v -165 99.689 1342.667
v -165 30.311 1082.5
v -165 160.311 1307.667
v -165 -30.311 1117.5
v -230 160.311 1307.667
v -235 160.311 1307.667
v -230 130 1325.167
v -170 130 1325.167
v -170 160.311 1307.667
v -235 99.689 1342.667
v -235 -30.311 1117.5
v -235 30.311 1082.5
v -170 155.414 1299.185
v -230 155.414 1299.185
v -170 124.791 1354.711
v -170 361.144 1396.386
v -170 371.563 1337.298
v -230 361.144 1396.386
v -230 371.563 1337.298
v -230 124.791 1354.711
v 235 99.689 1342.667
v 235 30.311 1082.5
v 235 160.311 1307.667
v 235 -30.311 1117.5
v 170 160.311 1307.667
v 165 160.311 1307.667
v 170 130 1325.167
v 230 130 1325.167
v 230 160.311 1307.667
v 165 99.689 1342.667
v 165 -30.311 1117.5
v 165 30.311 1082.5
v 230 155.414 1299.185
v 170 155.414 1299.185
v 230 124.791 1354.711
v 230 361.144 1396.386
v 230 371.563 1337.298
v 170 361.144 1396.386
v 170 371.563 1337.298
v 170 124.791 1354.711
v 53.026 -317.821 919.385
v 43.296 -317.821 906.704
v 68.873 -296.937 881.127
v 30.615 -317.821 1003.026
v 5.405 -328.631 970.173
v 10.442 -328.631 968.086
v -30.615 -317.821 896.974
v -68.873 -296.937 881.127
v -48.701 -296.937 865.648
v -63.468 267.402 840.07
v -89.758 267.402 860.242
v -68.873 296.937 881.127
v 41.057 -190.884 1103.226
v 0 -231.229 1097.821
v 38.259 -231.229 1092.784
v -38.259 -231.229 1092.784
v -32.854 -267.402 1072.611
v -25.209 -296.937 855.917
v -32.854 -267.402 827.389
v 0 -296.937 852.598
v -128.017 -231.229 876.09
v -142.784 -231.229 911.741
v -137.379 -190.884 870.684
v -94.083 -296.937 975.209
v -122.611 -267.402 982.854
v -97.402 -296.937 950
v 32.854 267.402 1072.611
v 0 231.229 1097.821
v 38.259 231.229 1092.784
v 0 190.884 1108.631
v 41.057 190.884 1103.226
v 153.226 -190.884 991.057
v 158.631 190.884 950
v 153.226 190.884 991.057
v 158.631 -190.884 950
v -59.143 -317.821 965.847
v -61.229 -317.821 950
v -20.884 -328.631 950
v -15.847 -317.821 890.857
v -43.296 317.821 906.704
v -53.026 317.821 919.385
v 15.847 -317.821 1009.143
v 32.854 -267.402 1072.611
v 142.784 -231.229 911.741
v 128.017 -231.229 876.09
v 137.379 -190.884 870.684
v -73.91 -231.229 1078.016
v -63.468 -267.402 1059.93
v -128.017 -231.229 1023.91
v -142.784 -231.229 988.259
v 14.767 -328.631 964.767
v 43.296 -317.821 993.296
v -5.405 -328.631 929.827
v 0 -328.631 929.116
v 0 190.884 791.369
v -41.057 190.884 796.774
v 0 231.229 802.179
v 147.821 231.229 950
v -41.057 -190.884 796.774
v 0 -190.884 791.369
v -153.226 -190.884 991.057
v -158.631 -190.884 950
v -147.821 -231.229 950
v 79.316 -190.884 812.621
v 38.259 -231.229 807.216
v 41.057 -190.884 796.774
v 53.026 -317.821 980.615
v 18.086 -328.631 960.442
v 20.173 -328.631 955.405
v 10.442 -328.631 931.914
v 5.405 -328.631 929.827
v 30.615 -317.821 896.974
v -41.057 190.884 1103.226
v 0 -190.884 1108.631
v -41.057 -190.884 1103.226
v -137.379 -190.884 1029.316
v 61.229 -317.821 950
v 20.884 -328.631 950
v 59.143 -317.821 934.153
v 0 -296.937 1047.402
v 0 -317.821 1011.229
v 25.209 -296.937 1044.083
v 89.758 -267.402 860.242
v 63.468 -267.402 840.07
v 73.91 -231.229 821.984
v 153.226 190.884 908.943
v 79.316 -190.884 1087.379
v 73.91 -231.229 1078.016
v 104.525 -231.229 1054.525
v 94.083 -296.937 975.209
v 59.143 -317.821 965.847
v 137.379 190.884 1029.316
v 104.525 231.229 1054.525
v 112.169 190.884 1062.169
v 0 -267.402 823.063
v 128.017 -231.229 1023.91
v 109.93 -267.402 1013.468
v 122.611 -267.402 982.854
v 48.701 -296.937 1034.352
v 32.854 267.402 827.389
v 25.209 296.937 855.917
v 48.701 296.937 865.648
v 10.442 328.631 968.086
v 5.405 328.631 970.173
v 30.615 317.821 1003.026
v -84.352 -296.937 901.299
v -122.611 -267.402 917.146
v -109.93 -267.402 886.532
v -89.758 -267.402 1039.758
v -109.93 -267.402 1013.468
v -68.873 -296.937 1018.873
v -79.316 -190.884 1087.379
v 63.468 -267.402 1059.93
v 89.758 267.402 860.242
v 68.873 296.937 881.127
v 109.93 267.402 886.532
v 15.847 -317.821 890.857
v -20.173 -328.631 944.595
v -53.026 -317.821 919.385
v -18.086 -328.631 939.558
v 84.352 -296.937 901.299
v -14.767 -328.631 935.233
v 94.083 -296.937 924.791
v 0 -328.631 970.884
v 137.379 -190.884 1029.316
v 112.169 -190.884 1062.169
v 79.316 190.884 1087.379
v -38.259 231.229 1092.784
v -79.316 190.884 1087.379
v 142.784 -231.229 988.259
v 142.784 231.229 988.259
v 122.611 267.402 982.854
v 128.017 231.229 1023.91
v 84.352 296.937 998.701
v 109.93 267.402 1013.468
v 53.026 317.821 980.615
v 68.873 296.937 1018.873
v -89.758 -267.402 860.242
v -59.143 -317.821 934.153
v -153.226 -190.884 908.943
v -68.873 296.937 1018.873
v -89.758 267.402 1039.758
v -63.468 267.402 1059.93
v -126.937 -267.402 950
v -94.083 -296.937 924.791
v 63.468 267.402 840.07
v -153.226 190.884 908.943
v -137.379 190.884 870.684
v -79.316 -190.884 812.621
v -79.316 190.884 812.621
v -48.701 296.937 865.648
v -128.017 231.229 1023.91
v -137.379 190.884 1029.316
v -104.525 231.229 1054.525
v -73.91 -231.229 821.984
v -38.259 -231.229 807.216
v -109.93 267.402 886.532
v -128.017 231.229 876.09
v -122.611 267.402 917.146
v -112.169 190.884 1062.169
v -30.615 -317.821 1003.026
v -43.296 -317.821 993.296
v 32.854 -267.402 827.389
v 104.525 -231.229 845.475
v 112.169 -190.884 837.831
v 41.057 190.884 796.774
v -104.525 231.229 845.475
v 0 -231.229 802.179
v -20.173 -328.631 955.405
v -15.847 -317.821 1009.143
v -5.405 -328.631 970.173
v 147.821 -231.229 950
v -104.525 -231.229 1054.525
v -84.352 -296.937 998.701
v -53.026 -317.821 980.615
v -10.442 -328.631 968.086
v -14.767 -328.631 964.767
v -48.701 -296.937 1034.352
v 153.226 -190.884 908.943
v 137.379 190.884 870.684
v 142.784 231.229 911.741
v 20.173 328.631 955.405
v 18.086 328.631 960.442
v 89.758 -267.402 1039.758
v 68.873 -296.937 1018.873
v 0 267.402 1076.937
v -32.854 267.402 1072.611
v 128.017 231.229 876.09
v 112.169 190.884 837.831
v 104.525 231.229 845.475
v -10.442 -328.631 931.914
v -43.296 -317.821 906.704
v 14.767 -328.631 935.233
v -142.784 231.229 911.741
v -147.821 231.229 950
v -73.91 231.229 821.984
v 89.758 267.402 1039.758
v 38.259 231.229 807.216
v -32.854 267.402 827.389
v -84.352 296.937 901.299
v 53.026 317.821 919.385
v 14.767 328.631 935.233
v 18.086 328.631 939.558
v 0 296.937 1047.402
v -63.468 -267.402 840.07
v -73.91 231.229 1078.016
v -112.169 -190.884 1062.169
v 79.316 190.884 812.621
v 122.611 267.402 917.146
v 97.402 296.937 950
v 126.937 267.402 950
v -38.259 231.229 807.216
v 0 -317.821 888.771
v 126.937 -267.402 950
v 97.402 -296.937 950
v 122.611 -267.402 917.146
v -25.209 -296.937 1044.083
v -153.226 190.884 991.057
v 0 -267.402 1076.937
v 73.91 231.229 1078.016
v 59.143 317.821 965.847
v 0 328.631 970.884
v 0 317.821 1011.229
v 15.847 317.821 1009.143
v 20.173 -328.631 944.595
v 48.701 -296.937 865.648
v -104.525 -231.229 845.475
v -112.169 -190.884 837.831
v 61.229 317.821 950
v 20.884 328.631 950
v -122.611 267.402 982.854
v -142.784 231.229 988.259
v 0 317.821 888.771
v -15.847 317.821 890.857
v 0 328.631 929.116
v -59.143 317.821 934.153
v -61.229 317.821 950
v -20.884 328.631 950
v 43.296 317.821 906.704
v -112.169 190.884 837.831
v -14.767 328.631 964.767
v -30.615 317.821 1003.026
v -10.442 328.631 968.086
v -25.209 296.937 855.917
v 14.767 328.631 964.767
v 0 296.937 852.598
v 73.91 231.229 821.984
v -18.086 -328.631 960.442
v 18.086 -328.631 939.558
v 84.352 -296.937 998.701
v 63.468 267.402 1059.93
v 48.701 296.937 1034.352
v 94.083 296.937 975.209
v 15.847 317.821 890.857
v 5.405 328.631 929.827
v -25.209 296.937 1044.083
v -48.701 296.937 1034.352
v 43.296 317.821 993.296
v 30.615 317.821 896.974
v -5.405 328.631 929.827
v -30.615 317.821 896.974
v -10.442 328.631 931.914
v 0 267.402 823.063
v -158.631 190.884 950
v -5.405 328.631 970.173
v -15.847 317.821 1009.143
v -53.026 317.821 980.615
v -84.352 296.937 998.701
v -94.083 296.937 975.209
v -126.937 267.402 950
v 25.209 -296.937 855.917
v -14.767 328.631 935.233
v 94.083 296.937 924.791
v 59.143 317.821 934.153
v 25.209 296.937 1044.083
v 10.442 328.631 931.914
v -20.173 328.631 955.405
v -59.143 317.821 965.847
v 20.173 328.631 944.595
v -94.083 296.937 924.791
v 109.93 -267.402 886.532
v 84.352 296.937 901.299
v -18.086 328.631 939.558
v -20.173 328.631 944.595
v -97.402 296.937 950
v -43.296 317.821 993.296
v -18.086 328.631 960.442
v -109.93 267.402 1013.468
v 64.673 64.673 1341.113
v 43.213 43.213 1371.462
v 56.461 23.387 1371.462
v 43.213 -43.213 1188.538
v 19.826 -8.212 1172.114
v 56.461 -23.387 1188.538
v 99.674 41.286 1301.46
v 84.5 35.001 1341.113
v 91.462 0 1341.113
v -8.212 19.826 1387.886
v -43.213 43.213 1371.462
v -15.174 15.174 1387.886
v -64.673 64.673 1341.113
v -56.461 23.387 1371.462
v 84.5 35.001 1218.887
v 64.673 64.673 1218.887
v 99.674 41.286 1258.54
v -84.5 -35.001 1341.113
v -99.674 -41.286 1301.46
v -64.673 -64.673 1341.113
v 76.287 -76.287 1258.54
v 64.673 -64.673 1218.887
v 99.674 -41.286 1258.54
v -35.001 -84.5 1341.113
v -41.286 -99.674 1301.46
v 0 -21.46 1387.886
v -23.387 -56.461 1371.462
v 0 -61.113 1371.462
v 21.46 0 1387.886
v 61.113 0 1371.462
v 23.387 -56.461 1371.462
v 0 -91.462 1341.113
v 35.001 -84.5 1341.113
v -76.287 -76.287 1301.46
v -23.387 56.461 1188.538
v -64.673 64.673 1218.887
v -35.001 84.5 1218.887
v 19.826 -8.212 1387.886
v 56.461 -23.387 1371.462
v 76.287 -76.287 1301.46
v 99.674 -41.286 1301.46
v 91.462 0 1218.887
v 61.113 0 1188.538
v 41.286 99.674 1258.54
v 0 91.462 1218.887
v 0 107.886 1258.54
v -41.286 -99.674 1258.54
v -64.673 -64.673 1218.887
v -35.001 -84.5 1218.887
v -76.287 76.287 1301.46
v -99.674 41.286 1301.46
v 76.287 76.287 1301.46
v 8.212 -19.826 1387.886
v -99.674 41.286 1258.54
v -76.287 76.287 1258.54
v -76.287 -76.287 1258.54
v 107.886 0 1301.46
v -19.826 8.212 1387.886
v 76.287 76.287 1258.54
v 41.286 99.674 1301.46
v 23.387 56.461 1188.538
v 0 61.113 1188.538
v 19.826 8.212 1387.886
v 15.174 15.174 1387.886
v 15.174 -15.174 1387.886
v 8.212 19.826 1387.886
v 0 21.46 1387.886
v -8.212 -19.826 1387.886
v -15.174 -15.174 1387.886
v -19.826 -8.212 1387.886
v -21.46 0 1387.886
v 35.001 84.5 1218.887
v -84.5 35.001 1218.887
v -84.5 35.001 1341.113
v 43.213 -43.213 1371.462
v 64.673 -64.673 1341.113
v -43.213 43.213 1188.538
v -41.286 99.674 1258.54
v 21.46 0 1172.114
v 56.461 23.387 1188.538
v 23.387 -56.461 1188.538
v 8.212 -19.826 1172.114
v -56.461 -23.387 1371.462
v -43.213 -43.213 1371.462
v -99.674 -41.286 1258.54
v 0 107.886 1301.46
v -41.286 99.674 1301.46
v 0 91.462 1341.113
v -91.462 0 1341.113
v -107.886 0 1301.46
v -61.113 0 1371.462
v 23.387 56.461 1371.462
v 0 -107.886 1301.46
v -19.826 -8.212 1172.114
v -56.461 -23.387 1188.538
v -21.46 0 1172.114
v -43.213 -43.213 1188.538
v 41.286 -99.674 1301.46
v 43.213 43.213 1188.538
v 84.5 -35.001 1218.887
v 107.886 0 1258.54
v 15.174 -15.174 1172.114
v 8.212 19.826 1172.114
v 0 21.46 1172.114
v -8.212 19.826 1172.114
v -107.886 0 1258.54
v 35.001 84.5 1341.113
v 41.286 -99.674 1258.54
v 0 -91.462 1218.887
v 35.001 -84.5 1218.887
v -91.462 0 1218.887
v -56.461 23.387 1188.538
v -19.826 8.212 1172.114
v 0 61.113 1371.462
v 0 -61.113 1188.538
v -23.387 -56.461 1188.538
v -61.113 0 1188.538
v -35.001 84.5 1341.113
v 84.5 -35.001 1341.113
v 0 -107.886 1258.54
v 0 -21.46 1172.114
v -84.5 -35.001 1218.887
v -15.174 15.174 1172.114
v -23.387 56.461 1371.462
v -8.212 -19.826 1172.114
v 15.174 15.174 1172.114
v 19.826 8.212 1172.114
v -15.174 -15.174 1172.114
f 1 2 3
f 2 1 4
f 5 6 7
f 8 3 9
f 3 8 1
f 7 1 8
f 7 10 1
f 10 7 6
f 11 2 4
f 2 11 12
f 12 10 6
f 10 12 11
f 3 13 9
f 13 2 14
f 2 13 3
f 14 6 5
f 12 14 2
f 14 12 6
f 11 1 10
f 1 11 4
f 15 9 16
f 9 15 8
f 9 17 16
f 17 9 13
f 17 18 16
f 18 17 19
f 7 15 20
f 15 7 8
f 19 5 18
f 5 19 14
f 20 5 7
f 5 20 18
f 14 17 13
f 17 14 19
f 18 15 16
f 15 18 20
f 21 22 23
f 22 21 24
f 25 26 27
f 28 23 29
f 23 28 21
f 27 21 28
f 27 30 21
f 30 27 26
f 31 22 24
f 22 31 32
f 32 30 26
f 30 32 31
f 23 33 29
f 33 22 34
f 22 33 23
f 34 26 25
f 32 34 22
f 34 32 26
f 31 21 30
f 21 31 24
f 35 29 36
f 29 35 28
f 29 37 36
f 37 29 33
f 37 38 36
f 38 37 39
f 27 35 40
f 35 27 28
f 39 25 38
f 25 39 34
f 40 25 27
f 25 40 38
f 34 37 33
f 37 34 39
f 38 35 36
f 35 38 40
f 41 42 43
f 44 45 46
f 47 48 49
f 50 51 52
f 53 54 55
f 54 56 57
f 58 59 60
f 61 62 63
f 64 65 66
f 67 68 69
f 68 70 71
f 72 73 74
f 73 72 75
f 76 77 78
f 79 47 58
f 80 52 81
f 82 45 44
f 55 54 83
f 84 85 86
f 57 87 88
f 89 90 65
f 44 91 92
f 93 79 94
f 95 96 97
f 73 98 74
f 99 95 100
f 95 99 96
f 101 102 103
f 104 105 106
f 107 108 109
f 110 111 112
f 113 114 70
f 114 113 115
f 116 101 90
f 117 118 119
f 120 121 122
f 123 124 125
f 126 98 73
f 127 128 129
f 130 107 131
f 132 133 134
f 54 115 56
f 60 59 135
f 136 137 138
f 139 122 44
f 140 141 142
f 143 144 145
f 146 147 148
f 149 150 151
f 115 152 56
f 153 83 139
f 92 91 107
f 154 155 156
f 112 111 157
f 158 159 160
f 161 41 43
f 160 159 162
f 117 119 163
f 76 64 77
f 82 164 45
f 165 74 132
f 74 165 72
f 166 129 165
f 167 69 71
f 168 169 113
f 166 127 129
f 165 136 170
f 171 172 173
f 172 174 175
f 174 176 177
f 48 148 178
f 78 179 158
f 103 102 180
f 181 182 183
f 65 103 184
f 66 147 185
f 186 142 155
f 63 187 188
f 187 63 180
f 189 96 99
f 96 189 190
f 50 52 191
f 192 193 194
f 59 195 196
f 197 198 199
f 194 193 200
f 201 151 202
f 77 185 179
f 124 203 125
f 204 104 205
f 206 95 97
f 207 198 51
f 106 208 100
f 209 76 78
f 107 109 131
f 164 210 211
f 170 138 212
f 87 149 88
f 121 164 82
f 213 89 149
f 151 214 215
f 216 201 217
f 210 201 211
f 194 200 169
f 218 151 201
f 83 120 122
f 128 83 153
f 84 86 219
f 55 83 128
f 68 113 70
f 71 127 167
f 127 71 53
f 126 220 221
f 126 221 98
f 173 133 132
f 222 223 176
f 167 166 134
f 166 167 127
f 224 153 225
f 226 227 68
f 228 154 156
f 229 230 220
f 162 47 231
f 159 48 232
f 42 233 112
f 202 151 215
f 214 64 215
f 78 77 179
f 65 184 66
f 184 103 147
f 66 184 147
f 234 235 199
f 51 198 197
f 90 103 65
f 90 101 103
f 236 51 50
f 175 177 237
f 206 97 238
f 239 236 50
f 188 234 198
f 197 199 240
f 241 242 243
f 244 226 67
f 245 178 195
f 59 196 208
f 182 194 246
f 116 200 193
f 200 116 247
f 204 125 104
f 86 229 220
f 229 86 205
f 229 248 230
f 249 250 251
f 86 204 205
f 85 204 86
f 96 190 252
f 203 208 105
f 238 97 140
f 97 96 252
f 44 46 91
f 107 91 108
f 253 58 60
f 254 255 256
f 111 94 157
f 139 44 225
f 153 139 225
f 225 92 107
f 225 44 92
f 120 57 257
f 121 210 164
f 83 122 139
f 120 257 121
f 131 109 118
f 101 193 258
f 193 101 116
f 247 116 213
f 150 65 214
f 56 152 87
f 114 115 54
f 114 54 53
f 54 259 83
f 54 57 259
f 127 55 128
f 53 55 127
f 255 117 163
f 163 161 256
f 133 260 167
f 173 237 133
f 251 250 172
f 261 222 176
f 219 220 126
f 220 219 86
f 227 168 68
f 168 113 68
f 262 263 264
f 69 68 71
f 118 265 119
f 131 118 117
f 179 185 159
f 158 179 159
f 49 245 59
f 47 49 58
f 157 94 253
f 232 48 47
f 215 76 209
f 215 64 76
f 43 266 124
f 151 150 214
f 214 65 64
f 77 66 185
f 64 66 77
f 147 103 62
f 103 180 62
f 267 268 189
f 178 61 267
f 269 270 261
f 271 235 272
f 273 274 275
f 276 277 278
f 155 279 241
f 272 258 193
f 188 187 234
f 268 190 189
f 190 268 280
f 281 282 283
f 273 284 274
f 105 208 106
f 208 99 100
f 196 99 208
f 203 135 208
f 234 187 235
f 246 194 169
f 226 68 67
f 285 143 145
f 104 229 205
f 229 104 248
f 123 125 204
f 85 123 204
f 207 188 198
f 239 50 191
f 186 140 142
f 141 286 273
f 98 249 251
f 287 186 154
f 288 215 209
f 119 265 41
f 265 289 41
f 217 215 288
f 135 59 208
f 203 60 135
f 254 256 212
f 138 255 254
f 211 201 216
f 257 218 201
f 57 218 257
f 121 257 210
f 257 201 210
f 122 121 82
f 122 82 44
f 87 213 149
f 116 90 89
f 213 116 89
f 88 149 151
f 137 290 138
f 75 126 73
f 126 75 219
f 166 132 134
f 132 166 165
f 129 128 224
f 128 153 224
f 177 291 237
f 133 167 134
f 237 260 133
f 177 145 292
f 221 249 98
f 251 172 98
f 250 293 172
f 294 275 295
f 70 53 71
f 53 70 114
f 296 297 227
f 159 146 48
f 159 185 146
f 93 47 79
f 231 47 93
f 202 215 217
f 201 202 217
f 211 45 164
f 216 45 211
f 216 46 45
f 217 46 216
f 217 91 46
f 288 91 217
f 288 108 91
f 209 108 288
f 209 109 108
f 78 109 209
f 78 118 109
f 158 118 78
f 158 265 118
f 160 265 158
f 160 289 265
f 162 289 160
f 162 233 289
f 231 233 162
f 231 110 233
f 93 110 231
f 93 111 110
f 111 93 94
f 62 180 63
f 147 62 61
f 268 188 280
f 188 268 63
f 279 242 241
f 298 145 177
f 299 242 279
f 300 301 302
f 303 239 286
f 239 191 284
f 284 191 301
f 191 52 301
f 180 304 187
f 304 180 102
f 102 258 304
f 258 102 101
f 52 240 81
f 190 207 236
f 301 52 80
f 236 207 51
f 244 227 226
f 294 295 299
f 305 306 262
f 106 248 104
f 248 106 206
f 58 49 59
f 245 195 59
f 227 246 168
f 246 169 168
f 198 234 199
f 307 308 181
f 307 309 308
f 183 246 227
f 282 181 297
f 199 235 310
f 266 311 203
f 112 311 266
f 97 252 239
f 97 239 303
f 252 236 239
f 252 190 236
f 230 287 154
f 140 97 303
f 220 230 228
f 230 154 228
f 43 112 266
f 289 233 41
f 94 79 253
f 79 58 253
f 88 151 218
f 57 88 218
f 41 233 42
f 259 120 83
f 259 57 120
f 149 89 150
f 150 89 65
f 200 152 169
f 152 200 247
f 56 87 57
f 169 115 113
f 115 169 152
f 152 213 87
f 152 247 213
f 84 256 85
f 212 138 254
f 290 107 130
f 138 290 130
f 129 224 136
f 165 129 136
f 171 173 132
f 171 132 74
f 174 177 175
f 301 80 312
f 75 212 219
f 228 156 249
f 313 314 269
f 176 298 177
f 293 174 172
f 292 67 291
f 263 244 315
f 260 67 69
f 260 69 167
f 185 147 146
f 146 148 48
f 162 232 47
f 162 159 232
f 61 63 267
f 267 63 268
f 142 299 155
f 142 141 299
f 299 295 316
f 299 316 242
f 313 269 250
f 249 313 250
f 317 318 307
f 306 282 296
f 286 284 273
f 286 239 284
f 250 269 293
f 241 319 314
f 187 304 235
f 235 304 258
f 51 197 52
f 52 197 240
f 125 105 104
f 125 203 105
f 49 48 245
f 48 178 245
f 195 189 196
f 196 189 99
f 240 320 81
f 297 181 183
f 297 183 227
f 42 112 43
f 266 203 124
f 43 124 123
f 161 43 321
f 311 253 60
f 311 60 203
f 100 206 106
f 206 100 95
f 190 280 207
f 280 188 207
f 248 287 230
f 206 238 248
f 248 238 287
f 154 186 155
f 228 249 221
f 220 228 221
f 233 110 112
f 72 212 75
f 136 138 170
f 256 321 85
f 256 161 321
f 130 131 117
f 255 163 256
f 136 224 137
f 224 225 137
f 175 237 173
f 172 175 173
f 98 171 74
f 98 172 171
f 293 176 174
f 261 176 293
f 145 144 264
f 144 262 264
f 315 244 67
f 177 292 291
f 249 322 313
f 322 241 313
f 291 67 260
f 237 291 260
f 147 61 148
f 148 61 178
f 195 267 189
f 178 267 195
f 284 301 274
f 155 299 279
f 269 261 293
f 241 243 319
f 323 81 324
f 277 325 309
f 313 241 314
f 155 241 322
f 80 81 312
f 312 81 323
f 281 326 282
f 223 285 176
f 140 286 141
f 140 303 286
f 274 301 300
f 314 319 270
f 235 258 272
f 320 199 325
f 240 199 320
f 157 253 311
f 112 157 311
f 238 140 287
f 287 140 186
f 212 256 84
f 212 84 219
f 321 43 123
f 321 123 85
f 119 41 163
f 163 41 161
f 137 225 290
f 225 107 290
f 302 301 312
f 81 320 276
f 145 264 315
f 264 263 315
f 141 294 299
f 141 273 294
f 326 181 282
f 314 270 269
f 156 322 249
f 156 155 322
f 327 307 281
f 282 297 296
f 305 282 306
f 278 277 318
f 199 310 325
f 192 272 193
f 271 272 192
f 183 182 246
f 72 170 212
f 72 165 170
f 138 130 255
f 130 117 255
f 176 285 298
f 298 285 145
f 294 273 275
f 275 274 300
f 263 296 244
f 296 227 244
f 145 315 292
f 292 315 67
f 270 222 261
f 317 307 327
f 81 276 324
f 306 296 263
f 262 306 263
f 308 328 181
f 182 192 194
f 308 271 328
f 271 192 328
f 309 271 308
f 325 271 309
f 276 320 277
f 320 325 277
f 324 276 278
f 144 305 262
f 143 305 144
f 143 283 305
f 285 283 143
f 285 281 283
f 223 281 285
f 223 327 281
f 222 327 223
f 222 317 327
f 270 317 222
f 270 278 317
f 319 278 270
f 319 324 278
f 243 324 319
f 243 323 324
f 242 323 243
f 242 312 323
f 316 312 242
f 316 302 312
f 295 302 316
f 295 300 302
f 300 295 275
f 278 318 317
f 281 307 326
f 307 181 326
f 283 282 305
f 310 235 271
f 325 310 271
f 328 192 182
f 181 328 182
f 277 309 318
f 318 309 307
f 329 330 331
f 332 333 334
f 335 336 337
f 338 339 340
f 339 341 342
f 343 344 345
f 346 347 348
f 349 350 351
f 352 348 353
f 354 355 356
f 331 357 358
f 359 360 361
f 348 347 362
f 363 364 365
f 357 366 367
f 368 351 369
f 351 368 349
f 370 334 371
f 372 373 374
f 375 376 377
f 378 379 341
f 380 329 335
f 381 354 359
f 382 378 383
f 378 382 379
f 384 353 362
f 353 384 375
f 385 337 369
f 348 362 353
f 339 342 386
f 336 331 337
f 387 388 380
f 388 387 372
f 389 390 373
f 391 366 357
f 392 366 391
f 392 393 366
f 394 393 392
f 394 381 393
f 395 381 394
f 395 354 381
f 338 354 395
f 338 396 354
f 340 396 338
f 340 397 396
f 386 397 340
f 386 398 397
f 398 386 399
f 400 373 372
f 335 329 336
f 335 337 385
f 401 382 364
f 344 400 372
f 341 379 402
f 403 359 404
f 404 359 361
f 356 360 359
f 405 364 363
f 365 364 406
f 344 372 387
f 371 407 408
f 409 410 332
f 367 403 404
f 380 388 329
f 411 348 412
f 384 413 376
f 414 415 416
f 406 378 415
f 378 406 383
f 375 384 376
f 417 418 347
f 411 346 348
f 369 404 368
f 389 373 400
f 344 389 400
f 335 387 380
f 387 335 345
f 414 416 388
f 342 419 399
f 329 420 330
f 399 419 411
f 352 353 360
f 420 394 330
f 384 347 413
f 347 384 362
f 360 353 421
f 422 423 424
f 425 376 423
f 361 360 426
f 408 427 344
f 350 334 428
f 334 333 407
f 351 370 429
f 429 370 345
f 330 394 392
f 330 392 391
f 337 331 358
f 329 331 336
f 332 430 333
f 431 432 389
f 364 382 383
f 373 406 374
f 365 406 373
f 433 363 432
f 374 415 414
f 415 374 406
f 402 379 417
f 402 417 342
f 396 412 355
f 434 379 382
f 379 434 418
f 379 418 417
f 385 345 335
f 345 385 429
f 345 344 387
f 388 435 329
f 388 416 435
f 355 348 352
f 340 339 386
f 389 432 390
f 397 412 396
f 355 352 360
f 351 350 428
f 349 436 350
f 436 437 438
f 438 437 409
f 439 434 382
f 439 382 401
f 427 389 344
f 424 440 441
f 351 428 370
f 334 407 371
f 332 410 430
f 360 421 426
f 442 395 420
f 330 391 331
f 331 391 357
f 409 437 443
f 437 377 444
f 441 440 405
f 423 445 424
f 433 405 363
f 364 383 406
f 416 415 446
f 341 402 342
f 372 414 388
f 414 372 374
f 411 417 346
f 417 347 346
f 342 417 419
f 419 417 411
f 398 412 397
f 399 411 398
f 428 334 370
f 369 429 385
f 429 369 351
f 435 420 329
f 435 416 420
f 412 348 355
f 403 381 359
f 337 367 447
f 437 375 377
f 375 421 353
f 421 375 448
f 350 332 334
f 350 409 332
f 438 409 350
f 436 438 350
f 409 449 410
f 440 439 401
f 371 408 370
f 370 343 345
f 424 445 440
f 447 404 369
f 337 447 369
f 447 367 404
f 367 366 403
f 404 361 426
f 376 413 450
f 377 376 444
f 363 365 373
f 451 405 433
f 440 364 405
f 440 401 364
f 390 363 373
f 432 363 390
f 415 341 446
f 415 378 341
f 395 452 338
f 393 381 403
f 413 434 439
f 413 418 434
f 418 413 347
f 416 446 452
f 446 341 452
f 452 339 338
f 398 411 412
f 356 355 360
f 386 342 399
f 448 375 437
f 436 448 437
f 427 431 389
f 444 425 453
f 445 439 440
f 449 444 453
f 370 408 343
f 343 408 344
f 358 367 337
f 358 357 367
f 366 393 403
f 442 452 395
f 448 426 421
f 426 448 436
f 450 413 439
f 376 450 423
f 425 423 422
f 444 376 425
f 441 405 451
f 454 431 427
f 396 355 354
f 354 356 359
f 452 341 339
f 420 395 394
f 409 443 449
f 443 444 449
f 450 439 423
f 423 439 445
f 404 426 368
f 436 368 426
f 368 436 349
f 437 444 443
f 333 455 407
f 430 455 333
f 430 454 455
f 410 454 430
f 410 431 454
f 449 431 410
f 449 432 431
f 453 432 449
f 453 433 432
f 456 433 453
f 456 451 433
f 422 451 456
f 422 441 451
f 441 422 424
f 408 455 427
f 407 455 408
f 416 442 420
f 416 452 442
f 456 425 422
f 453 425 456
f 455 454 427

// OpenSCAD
// Proportion sketch for the seated worker.
// The arm is split at the elbow here only to check reach and pivot heights —
// in the shipped scene the hinge is a nested <group>, not two meshes.

torso_r     = 160;  // mm
torso_len   = 340;
torso_y     = 950;
head_r      = 110;
head_y      = 1280;
shoulder_y  = 1100;
shoulder_x  =  200;
upper_len   =  260;
fore_len    =  240;

module capsule(r, len) {
  hull() {
    translate([0, 0,  len / 2]) sphere(r = r, $fn = 24);
    translate([0, 0, -len / 2]) sphere(r = r, $fn = 24);
  }
}

module arm(elbow_deg = 50) {
  rotate([-30, 0, 0]) {
    translate([0, 0, upper_len / 2]) cube([70, 70, upper_len], center = true);
    translate([0, 0, upper_len])
      rotate([-elbow_deg, 0, 0])
        translate([0, 0, fore_len / 2]) cube([60, 60, fore_len], center = true);
  }
}

module worker() {
  translate([0, 0, torso_y]) rotate([90, 0, 0]) capsule(torso_r, torso_len);
  translate([0, 0, head_y]) sphere(r = head_r, $fn = 16);
  for (sx = [-1, 1]) translate([sx * shoulder_x, 0, shoulder_y]) arm();
}

worker();
